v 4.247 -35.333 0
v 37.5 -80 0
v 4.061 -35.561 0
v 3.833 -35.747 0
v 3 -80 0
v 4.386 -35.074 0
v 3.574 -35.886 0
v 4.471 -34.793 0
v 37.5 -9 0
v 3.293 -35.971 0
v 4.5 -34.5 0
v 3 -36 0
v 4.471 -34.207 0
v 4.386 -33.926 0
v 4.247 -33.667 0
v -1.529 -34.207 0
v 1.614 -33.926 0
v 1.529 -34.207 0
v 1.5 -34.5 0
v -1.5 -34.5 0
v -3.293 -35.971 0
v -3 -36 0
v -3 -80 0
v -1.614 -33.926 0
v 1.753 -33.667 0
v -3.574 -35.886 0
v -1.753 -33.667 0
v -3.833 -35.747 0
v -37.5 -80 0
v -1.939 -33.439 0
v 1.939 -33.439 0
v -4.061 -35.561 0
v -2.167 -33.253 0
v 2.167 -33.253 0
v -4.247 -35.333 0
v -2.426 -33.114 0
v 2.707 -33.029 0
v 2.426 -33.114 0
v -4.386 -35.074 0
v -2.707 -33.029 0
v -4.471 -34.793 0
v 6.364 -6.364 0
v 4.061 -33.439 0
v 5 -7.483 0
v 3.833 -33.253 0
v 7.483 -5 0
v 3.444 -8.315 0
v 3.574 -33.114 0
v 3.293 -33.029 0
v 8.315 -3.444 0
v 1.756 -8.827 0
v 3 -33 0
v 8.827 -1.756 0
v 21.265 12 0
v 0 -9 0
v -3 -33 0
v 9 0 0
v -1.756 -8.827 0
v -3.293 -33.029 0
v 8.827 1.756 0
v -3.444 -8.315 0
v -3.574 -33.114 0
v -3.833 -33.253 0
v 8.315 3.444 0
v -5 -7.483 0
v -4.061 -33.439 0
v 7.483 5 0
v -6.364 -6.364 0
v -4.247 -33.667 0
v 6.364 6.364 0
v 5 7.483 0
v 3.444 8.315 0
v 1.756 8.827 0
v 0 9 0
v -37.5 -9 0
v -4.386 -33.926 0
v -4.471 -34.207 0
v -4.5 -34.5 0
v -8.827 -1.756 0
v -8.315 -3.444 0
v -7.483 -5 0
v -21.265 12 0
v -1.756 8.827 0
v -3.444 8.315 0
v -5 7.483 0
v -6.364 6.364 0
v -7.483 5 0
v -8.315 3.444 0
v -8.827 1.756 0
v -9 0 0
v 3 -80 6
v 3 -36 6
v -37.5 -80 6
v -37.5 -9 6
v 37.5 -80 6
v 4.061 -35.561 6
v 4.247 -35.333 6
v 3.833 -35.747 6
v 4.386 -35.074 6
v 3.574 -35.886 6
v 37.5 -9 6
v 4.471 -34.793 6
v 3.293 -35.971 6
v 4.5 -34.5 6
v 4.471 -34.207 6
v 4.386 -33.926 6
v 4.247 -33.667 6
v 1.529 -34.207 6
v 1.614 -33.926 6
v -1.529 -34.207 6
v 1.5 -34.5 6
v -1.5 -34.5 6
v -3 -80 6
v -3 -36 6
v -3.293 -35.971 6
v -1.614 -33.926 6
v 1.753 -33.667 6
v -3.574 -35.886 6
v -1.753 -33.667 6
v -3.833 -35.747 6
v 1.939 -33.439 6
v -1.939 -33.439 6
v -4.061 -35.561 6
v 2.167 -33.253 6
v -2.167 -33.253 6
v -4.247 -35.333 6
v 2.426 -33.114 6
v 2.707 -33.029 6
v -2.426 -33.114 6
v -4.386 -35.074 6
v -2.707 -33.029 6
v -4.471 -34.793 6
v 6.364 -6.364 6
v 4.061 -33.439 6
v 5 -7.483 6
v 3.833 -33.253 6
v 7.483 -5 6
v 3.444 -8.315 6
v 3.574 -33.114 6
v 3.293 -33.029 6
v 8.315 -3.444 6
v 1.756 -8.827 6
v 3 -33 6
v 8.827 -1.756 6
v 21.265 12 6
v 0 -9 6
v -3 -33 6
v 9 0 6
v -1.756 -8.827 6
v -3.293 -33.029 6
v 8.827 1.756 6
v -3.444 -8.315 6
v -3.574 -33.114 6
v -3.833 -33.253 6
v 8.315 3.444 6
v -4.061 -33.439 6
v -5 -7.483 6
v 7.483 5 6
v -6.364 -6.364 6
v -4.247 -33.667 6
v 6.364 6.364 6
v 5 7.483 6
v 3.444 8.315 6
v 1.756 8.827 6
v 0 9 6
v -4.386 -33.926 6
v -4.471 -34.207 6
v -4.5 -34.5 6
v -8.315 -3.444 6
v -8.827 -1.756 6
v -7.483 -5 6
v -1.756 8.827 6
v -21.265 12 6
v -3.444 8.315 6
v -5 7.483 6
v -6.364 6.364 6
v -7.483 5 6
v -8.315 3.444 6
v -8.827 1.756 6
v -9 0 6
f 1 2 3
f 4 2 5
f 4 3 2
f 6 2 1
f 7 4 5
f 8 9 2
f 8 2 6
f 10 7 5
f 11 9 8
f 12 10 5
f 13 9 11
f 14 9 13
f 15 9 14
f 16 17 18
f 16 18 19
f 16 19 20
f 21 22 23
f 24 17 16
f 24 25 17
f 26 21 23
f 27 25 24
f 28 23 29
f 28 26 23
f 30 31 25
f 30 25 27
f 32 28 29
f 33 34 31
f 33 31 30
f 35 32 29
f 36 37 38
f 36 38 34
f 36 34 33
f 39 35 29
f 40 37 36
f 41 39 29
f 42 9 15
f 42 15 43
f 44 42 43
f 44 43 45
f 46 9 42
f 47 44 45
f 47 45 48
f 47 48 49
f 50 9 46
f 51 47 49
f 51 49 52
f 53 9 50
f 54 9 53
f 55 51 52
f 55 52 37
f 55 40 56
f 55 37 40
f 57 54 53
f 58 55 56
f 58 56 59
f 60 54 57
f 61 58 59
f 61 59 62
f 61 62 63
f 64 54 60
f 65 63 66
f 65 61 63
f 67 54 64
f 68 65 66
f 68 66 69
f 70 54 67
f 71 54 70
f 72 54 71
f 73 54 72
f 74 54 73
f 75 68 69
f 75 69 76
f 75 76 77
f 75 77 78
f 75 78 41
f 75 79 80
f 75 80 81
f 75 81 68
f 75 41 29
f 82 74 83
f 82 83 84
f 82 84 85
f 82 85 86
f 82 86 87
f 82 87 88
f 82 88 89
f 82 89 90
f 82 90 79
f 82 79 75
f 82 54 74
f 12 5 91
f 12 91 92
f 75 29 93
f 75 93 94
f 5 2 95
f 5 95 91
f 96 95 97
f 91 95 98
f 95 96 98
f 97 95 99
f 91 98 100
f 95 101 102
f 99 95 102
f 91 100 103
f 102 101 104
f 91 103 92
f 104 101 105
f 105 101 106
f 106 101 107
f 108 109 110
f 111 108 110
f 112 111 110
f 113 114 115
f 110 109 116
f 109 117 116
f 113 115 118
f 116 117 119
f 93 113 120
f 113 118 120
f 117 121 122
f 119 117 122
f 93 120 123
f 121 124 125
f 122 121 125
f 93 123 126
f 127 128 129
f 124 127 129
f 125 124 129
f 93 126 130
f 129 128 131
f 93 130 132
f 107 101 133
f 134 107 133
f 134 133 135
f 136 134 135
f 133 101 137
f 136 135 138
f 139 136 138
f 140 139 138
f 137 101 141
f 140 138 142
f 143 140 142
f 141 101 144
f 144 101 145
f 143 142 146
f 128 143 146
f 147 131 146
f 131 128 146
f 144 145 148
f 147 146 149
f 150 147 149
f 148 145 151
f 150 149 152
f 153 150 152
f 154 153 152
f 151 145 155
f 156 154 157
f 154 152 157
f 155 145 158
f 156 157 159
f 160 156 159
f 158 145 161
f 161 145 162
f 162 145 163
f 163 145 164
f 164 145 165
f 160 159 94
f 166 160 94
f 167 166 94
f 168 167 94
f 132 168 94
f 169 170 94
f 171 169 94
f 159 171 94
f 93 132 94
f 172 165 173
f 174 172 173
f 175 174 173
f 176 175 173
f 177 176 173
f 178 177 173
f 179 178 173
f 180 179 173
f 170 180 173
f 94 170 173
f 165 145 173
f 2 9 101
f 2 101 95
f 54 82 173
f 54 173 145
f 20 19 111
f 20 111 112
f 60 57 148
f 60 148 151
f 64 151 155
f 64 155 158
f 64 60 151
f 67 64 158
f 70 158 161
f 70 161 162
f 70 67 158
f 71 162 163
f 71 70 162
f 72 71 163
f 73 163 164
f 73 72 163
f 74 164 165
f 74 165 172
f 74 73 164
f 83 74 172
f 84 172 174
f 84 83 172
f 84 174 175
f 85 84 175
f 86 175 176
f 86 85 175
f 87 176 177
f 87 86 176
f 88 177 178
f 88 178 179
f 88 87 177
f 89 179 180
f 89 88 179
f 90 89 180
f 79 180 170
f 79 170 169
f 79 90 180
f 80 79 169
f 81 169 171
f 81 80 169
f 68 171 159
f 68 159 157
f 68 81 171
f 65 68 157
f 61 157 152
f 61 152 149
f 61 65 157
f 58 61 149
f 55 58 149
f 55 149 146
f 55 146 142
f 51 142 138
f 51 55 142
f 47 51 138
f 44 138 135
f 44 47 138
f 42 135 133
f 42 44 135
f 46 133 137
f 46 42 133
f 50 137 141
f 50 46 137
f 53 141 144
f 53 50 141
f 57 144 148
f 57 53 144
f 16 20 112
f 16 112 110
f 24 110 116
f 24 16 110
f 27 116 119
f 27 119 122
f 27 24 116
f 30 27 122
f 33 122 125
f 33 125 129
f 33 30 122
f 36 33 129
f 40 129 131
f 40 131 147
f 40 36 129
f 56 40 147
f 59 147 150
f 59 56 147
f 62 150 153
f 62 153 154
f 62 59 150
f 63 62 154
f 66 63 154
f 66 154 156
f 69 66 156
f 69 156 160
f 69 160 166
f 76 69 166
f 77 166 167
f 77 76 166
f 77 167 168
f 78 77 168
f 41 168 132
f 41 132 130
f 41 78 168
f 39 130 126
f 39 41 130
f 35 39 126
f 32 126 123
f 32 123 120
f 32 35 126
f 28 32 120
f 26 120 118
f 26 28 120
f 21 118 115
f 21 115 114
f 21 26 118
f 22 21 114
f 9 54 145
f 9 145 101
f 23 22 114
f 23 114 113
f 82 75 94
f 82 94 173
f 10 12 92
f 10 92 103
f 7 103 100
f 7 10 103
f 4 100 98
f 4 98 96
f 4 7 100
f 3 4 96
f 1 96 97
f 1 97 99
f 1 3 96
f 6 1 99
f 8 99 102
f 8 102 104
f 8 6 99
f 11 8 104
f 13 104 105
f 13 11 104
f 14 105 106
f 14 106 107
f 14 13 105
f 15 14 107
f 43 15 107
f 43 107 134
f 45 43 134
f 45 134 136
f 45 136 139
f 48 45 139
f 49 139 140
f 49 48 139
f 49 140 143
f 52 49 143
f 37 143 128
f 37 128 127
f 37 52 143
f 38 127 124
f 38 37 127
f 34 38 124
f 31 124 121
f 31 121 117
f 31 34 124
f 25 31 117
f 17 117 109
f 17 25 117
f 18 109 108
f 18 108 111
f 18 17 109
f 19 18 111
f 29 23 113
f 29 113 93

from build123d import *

# Parameters (mm, degrees)
SKETCH1_R           = 9
BOSS_EXTRUDE1_DEPTH = 6


with BuildPart() as part:
    # Sketch1 → Boss-Extrude1 (new body)
    with BuildSketch(Plane.XY):
        with BuildLine():
            Line((-37.5, -9), (-21.265472453, 12))
            Line((-21.265472453, 12), (21.265472453, 12))
            Line((21.265472453, 12), (37.5, -9))
            Line((37.5, -9), (37.5, -80))
            Line((37.5, -80), (3, -80))
            Line((3, -80), (3, -36))
            ThreePointArc((3, -36), (4.060660172, -33.439339828), (1.5, -34.5))
            Line((1.5, -34.5), (-1.5, -34.5))
            ThreePointArc((-1.5, -34.5), (-4.060660172, -33.439339828), (-3, -36))
            Line((-3, -36), (-3, -80))
            Line((-3, -80), (-37.5, -80))
            Line((-37.5, -80), (-37.5, -9))
        make_face()
        Circle(SKETCH1_R, mode=Mode.SUBTRACT)
    extrude(amount=BOSS_EXTRUDE1_DEPTH)


solid = part.part
